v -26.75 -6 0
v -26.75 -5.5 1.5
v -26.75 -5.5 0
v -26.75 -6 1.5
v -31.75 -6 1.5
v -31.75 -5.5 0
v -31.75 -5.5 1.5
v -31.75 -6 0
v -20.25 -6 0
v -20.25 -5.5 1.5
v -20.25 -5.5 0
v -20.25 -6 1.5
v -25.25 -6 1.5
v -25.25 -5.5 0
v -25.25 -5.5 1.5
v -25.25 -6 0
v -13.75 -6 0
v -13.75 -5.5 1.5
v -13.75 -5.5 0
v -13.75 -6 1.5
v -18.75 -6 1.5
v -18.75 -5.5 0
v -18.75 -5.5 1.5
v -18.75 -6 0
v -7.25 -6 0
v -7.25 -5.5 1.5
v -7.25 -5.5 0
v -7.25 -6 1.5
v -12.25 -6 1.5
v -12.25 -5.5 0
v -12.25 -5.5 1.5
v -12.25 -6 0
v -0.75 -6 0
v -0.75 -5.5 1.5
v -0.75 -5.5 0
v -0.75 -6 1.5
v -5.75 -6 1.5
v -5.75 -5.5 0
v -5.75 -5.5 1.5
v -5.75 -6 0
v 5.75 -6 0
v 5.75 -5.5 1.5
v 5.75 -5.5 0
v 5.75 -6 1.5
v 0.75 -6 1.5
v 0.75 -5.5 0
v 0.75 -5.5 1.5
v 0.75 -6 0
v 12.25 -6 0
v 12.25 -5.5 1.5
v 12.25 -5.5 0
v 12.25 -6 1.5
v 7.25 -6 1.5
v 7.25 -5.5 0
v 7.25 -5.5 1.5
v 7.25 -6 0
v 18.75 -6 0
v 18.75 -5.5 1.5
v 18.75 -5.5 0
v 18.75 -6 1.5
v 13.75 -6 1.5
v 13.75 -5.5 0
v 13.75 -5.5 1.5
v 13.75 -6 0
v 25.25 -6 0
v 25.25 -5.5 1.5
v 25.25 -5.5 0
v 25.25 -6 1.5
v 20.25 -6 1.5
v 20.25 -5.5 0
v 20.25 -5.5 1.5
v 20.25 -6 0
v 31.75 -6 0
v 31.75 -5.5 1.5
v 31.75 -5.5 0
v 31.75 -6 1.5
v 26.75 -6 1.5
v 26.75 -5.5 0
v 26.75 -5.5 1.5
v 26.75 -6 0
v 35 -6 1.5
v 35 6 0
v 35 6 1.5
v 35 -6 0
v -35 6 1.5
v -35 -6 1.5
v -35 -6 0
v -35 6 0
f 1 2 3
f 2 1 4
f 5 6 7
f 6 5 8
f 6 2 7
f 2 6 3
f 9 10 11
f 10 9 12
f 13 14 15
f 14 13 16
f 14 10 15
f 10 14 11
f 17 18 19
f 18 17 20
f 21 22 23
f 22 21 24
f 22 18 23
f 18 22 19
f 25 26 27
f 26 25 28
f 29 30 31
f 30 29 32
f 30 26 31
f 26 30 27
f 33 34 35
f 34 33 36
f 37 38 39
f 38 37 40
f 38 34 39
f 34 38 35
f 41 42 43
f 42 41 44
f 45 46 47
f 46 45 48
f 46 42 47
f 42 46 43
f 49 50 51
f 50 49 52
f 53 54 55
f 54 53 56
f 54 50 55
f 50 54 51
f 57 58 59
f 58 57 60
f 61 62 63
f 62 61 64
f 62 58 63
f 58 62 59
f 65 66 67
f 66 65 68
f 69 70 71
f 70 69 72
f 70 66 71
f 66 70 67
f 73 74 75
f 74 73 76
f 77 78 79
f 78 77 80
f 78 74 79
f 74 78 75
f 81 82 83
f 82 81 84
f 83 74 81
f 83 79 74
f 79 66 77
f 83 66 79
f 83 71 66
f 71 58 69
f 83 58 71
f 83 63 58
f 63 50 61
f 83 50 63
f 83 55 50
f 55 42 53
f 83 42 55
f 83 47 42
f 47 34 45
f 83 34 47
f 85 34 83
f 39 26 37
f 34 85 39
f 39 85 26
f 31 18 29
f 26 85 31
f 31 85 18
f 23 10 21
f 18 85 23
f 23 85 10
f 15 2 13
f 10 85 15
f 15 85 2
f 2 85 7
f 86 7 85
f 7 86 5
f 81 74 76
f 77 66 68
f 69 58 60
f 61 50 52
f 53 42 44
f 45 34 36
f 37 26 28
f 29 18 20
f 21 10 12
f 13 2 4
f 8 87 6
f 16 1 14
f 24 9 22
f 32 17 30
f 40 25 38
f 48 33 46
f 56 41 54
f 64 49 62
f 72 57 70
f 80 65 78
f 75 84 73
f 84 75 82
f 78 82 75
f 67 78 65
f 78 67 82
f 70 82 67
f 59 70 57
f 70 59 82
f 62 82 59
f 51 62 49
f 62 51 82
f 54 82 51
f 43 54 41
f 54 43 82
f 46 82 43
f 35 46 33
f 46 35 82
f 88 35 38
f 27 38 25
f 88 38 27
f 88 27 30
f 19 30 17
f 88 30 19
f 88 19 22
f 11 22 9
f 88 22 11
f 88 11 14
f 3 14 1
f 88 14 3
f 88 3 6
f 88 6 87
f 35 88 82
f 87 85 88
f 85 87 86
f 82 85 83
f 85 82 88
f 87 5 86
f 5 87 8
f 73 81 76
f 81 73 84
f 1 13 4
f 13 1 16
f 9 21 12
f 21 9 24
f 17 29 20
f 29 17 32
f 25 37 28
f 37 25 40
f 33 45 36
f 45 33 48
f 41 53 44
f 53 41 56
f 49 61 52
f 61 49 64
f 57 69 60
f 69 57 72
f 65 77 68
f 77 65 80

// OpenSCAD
// 10-well agarose gel comb, printed flat
// Units: mm

// ---------- Parameters ----------
spine_len      = 70;    // spine length (X)
spine_wid      = 12;    // spine width (Y)
plate_thk      = 1.5;   // plate thickness (Z)

tooth_count    = 10;    // number of teeth
tooth_w        = 5.0;   // tooth width (X)
tooth_len      = 12;    // tooth length from spine (Y, -Y direction)
tooth_gap      = 1.5;   // gap between neighbouring teeth (X)

eps            = 0.5;   // cutter overshoot past faces

$fn = 64;

// ---------- Derived ----------
pitch   = tooth_w + tooth_gap;          // centre-to-centre spacing
x_start = -(tooth_count - 1) * pitch / 2; // first tooth centre (row centred on spine)

// ---------- Model ----------
difference() {
    // Base plate
    translate([-spine_len / 2, -spine_wid / 2, 0])
        cube([spine_len, spine_wid, plate_thk]);

    // Teeth cut out from the -Y edge of the spine
    for (i = [0 : tooth_count - 1])
        translate([x_start + i * pitch - tooth_w / 2,
                   -spine_wid / 2 - tooth_len,
                   -eps])
            cube([tooth_w, tooth_len + eps, plate_thk + 2 * eps]);
}
